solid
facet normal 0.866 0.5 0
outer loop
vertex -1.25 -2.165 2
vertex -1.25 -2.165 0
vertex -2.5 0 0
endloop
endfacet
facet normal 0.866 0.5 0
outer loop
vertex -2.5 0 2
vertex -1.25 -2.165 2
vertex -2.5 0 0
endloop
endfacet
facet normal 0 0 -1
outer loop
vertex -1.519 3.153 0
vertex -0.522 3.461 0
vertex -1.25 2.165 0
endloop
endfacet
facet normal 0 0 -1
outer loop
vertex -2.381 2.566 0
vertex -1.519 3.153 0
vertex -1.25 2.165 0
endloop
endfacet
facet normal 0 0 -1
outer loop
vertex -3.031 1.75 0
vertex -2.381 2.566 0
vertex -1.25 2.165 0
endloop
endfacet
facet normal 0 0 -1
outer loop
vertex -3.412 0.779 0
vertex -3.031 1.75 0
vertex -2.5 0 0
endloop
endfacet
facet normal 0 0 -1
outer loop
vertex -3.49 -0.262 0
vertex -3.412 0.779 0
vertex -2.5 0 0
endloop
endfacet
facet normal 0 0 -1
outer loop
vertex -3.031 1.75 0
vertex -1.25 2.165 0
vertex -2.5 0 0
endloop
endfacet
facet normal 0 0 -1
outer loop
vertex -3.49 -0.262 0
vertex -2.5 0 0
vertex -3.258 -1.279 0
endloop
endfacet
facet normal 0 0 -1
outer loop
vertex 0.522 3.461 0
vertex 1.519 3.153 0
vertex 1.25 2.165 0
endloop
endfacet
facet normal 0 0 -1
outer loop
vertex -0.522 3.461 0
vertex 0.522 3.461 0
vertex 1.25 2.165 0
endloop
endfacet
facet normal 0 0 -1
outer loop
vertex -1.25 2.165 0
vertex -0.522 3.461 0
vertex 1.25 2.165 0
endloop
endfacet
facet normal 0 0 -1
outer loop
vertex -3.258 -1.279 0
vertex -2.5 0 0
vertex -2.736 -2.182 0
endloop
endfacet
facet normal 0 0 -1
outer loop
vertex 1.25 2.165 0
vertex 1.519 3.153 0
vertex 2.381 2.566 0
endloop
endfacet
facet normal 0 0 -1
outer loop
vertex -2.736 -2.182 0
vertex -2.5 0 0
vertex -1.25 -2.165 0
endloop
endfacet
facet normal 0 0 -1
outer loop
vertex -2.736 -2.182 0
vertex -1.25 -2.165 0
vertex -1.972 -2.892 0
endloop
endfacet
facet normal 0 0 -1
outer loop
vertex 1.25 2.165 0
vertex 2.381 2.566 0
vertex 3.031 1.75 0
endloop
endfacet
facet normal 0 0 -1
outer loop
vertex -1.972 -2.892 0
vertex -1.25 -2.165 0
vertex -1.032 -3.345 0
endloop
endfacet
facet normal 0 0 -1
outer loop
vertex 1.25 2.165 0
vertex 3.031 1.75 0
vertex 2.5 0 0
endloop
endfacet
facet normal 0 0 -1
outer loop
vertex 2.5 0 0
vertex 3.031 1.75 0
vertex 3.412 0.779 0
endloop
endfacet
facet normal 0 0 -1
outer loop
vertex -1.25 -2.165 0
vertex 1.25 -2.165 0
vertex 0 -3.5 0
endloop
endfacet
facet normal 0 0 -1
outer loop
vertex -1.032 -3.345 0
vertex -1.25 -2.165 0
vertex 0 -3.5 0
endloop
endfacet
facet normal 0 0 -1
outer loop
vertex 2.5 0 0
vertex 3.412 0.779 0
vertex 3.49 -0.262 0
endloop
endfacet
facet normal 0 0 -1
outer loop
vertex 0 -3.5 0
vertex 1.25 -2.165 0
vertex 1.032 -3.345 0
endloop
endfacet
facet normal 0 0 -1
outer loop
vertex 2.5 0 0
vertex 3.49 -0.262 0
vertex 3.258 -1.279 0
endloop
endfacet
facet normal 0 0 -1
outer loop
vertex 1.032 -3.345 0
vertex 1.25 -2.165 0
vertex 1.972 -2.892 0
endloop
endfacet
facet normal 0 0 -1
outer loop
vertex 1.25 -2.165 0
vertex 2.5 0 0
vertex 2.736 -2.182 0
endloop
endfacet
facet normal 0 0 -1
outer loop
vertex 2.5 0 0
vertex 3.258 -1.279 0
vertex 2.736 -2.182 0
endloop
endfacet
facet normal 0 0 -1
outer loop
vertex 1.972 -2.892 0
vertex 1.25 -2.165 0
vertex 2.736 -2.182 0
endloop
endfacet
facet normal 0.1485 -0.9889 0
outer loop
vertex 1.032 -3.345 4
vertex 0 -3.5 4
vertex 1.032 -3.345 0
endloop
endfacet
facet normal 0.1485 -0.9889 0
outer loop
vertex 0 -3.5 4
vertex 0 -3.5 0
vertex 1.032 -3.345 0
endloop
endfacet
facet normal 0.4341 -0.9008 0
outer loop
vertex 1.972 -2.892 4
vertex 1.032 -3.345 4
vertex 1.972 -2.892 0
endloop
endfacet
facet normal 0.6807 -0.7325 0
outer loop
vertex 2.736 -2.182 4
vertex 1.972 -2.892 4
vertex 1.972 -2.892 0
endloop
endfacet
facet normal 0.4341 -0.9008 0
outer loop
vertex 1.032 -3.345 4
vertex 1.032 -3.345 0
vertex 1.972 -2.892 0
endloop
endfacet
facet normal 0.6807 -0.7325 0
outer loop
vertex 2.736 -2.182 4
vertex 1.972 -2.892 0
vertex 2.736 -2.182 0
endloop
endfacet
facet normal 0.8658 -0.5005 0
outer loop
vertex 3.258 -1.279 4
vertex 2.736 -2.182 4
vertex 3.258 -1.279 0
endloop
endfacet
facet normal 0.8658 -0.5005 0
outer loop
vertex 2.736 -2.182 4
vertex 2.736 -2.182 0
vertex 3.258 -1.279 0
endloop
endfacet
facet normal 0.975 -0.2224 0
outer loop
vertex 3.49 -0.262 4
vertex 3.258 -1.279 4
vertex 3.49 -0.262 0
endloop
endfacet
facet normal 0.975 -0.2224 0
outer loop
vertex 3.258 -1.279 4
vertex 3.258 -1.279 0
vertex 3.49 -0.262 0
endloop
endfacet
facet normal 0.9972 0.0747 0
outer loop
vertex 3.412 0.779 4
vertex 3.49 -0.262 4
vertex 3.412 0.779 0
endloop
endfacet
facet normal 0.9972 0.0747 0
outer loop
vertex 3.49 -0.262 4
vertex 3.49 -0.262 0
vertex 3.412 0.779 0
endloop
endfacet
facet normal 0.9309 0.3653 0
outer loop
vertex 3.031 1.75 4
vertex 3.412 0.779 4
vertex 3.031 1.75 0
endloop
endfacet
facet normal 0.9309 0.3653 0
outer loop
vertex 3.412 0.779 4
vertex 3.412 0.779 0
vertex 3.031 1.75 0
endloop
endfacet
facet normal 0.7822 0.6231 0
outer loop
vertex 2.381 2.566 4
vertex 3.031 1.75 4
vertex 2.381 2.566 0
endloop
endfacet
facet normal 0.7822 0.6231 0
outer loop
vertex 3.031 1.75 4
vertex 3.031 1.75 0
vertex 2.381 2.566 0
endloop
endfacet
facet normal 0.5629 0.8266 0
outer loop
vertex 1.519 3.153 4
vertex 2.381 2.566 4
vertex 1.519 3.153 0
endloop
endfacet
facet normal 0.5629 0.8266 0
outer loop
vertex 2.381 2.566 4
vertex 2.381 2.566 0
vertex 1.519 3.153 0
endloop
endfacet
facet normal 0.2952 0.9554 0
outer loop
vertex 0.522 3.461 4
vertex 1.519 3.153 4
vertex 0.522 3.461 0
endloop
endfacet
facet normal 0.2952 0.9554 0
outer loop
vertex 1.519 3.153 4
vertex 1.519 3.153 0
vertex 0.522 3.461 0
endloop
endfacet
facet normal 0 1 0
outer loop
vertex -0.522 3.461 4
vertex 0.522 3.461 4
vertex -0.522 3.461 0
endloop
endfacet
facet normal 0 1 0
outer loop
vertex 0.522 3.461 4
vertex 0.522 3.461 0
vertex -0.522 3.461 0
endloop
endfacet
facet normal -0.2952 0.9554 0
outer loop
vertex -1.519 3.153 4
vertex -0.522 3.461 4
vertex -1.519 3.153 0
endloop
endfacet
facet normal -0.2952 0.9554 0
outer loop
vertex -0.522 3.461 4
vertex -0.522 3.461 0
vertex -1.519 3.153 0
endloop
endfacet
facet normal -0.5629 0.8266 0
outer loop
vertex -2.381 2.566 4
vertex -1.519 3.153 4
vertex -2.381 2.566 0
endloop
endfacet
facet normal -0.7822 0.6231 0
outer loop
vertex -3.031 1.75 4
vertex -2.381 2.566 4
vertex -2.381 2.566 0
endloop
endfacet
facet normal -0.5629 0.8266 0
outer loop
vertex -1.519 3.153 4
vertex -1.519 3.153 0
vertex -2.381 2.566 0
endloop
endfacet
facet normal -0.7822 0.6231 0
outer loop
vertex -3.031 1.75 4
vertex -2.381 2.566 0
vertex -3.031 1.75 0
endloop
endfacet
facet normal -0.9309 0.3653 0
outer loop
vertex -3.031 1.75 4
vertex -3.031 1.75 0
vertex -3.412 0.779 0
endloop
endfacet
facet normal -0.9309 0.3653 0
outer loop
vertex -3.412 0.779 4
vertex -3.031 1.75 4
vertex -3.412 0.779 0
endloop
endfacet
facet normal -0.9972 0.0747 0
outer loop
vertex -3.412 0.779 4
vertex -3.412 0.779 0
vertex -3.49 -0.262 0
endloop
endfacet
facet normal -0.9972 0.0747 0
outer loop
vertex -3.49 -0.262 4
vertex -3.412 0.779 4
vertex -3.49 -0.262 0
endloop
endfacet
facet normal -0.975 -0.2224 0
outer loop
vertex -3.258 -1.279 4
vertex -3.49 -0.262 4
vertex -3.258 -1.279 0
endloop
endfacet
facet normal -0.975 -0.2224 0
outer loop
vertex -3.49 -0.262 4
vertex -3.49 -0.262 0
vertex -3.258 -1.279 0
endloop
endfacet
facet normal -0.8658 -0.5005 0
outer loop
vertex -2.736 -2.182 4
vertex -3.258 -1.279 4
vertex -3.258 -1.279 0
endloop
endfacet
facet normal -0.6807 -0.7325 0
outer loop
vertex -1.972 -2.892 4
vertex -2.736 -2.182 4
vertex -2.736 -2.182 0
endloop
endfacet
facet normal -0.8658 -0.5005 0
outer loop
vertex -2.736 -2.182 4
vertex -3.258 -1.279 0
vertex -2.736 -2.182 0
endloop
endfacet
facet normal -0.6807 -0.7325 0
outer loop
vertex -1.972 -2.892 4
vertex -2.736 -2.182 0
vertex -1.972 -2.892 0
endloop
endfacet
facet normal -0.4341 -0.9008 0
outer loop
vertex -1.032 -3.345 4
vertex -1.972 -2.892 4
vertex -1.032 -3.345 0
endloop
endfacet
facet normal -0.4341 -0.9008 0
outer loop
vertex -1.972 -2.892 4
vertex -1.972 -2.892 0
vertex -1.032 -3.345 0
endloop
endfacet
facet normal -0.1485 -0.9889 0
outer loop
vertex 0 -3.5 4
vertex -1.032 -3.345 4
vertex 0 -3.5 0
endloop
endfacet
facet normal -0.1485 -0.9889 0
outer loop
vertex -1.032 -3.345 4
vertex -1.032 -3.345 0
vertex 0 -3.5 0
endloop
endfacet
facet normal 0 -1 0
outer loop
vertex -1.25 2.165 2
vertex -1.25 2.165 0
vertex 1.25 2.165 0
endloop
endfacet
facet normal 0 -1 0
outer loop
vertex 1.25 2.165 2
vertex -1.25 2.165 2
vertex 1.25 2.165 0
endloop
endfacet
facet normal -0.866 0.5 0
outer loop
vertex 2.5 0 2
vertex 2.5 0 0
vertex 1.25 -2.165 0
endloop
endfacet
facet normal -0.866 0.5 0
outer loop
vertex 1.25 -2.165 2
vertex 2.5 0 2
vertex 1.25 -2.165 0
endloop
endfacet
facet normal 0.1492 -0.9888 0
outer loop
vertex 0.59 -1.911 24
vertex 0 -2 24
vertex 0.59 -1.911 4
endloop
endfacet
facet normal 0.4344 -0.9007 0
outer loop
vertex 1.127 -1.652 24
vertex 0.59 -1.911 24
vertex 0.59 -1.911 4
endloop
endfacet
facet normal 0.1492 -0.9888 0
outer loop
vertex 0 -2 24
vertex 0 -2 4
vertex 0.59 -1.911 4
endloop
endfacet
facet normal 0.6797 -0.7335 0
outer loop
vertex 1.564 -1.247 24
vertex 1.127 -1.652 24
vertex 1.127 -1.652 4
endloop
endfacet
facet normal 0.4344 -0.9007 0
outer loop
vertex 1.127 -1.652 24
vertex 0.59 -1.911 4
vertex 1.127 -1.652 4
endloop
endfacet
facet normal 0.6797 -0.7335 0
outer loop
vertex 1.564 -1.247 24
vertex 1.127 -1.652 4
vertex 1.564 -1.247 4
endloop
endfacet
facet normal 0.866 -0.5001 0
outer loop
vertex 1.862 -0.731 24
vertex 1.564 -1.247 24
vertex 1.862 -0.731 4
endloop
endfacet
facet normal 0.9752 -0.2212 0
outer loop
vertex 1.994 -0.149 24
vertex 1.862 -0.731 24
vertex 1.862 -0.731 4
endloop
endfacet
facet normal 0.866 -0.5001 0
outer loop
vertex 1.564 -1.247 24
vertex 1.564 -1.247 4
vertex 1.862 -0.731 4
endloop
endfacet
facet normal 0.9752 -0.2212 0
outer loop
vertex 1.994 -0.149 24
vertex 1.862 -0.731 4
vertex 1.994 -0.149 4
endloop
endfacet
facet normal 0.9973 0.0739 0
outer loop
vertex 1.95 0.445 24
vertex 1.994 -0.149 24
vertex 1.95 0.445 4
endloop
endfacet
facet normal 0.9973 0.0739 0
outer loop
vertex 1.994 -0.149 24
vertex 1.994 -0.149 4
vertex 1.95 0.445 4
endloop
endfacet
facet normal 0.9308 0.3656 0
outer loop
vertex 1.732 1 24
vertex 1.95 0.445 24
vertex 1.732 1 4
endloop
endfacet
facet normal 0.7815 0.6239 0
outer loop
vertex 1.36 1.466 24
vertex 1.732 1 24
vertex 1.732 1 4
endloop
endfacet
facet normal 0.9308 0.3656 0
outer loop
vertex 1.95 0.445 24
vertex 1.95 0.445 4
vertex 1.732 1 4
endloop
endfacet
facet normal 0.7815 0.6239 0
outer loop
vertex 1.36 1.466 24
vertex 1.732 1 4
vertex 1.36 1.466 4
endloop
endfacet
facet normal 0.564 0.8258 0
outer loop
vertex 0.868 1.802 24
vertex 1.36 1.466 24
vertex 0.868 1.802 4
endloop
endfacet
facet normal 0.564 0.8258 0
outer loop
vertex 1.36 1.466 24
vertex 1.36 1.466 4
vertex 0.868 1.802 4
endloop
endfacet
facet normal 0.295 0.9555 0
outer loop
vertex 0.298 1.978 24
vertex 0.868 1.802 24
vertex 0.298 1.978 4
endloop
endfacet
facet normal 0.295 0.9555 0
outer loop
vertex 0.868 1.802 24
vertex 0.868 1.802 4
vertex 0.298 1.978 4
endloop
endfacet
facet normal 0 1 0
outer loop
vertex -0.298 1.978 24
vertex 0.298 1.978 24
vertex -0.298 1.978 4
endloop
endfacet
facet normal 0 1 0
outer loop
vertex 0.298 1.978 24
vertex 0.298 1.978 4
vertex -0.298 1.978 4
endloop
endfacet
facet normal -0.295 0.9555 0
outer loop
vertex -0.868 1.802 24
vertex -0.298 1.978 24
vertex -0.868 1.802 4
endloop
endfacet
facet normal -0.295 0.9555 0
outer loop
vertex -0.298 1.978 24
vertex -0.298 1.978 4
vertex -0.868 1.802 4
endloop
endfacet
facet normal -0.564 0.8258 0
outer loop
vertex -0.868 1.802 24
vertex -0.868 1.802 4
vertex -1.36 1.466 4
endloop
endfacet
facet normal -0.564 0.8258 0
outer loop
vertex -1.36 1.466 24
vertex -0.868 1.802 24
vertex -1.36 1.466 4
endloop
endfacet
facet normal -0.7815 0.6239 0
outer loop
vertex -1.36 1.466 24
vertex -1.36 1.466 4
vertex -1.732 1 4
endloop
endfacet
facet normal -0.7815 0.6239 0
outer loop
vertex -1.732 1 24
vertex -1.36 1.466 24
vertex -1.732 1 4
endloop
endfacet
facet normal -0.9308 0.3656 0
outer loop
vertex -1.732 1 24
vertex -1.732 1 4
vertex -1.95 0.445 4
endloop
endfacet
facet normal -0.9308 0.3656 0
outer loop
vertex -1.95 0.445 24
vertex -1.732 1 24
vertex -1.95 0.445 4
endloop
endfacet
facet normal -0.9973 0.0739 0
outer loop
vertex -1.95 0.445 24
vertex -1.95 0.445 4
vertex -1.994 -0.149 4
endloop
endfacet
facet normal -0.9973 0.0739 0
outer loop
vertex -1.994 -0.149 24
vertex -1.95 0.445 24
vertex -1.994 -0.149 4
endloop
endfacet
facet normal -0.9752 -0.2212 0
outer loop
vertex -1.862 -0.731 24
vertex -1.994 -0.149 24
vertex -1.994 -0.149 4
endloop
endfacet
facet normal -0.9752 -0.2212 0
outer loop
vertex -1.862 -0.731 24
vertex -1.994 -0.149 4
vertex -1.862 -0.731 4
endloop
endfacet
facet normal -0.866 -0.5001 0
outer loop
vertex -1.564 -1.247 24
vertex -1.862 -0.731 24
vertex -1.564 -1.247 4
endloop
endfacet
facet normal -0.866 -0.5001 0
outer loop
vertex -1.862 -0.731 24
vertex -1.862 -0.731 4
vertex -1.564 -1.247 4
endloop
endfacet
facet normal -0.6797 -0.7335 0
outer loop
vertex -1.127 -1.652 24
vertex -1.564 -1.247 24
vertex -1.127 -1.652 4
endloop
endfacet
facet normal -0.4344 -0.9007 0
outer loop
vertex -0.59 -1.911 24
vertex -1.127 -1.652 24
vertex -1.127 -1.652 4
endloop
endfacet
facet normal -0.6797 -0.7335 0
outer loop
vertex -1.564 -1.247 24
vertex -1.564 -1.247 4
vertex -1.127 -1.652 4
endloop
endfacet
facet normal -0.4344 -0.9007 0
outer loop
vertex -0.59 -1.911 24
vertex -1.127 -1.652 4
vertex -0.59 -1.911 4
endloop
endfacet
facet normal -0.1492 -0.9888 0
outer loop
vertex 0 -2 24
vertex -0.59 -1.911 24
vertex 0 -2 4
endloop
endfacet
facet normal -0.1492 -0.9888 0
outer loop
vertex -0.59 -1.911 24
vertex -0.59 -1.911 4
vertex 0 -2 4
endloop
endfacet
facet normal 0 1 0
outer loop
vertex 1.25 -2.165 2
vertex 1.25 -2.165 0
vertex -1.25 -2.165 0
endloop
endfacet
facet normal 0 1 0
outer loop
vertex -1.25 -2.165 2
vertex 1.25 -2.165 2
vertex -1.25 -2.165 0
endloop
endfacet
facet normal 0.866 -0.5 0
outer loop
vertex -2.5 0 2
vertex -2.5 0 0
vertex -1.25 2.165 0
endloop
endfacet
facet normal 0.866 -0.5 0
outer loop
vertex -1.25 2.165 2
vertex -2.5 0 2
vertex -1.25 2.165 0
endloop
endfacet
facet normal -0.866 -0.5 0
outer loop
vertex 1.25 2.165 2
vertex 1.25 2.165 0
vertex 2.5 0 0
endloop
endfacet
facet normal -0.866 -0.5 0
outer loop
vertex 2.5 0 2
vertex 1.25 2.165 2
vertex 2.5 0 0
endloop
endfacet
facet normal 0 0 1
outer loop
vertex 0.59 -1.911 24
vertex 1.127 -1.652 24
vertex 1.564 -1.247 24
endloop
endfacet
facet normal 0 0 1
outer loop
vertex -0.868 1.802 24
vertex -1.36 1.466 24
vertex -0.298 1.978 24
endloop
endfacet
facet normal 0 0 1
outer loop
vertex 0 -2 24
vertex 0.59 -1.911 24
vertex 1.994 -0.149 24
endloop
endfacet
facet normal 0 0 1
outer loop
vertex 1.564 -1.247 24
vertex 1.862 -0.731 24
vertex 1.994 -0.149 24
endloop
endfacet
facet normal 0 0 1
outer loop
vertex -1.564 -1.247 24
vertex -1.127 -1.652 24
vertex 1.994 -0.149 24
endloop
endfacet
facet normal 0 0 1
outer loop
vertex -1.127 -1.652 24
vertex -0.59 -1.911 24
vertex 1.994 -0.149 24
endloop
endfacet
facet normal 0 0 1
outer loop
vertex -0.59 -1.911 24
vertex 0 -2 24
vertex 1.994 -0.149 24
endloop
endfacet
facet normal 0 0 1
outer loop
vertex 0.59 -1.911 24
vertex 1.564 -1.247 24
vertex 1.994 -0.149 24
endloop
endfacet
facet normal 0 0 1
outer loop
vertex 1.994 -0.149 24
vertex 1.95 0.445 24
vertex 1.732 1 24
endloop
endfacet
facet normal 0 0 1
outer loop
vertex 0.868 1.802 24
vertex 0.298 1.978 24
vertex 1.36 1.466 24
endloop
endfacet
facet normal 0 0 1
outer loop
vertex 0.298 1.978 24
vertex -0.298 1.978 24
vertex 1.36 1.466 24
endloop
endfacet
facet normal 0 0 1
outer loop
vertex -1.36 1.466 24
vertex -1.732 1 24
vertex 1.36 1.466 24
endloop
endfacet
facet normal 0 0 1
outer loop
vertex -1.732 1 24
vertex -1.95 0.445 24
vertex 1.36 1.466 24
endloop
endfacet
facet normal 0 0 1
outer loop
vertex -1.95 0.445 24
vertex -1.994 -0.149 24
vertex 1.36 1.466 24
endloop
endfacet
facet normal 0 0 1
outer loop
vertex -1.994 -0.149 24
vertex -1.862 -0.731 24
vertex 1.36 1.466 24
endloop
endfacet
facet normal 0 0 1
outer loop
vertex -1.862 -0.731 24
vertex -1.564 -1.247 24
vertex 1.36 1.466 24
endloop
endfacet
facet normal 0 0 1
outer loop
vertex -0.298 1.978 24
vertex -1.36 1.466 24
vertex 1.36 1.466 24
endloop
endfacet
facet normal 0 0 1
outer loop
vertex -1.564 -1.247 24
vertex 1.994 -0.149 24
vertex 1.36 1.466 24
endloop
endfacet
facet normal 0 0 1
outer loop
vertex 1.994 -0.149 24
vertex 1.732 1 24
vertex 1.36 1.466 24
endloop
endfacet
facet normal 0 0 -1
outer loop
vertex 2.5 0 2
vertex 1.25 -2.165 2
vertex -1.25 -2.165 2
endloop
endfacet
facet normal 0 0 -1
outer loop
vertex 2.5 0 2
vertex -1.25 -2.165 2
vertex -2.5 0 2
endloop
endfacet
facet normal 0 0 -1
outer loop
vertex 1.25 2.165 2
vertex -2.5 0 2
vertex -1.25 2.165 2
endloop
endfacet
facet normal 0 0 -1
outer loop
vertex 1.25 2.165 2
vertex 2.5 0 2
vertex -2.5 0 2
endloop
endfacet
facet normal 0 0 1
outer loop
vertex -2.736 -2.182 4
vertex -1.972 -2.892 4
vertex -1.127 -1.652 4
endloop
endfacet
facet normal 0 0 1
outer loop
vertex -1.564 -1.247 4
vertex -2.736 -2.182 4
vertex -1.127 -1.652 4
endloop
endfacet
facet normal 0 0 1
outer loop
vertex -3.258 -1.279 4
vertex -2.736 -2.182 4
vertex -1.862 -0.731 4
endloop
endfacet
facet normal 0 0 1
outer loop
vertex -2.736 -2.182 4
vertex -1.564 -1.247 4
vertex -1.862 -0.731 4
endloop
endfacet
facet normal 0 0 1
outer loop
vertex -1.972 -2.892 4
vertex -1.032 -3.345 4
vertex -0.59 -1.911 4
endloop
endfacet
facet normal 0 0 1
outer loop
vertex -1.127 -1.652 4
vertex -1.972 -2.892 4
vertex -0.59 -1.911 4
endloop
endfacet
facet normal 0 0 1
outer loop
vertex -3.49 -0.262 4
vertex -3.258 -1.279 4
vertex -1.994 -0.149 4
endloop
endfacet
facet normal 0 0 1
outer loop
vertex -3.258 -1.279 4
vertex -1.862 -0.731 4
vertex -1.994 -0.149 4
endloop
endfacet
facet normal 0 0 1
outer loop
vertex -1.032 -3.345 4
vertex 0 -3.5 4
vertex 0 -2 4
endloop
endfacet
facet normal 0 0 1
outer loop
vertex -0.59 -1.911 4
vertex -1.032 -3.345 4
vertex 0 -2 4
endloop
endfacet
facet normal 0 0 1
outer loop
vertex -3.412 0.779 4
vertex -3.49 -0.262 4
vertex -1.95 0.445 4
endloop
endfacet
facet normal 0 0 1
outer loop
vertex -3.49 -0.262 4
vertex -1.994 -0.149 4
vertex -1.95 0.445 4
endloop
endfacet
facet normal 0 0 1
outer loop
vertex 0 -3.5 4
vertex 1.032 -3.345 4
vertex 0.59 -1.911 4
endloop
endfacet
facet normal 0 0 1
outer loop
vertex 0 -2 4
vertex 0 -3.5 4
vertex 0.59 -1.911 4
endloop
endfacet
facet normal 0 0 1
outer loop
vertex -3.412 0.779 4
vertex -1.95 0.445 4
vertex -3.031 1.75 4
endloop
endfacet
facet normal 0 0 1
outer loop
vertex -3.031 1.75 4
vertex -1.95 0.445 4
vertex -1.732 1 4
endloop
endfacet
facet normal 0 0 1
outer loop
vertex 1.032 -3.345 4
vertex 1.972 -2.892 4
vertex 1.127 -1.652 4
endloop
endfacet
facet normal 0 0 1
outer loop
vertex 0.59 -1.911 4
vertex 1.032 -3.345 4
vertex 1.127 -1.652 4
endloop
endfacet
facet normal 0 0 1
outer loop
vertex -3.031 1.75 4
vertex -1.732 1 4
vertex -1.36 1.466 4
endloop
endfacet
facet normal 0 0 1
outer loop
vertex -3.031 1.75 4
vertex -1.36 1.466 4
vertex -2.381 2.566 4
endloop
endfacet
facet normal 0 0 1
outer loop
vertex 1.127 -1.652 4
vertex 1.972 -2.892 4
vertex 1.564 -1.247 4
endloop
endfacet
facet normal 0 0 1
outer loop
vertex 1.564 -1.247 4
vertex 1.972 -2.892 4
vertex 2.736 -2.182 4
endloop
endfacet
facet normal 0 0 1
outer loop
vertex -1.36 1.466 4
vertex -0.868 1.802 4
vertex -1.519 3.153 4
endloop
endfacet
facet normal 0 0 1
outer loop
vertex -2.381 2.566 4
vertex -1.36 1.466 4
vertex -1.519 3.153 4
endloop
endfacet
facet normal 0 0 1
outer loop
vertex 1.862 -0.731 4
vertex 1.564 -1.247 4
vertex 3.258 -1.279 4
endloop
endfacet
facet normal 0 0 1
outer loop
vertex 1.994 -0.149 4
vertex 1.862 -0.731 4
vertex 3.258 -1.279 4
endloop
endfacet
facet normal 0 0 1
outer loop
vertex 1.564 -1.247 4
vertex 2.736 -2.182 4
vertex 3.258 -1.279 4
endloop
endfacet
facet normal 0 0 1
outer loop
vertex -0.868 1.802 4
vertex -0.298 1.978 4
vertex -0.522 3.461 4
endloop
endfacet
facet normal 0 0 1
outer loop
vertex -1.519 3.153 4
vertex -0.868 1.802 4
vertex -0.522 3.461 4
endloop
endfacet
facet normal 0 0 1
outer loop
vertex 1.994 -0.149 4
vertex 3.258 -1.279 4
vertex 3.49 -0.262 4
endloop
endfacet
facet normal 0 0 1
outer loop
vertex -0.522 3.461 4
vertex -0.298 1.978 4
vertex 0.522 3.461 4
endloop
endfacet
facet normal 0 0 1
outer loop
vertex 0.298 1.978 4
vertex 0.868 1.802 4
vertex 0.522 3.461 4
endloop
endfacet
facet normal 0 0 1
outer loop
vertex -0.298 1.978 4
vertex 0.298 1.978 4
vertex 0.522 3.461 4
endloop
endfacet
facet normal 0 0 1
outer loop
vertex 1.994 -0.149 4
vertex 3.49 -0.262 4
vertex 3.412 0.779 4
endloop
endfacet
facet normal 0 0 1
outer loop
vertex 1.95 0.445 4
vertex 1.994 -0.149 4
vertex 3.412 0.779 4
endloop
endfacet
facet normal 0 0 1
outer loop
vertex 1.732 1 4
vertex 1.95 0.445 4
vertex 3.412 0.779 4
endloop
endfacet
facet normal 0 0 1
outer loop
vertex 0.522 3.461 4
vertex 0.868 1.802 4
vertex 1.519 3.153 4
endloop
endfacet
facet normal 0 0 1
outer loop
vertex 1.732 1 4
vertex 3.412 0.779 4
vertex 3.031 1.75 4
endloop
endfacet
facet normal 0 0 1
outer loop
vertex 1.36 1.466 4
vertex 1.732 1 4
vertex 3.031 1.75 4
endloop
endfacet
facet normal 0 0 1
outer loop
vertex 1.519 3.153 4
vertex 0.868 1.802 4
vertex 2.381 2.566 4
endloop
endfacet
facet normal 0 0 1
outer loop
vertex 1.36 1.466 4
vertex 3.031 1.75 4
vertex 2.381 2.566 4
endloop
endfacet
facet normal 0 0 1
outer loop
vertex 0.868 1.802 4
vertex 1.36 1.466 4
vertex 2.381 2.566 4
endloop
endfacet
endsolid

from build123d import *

# Parameters (mm, degrees)
POCKET_DEPTH = 2


with BuildPart() as part:
    # Sketch → Revolution (revolve)
    with BuildSketch(Plane.YZ):
        Polygon((-3.5, 4), (-3.5, 0), (0, 0), (0, 24), (-2, 24), (-2, 4), align=None)
    revolve(axis=Axis((0, 0, 0), (0, 0, 1)))

    # Sketch001 (on Face2 of Revolution) → Pocket (cut)
    with BuildSketch(Plane.YX):
        Polygon((0, 2.5), (-2.165064, 1.25), (-2.165064, -1.25), (0, -2.5), (2.165064, -1.25), (2.165064, 1.25), align=None)
    extrude(amount=-POCKET_DEPTH, mode=Mode.SUBTRACT)


solid = part.part
